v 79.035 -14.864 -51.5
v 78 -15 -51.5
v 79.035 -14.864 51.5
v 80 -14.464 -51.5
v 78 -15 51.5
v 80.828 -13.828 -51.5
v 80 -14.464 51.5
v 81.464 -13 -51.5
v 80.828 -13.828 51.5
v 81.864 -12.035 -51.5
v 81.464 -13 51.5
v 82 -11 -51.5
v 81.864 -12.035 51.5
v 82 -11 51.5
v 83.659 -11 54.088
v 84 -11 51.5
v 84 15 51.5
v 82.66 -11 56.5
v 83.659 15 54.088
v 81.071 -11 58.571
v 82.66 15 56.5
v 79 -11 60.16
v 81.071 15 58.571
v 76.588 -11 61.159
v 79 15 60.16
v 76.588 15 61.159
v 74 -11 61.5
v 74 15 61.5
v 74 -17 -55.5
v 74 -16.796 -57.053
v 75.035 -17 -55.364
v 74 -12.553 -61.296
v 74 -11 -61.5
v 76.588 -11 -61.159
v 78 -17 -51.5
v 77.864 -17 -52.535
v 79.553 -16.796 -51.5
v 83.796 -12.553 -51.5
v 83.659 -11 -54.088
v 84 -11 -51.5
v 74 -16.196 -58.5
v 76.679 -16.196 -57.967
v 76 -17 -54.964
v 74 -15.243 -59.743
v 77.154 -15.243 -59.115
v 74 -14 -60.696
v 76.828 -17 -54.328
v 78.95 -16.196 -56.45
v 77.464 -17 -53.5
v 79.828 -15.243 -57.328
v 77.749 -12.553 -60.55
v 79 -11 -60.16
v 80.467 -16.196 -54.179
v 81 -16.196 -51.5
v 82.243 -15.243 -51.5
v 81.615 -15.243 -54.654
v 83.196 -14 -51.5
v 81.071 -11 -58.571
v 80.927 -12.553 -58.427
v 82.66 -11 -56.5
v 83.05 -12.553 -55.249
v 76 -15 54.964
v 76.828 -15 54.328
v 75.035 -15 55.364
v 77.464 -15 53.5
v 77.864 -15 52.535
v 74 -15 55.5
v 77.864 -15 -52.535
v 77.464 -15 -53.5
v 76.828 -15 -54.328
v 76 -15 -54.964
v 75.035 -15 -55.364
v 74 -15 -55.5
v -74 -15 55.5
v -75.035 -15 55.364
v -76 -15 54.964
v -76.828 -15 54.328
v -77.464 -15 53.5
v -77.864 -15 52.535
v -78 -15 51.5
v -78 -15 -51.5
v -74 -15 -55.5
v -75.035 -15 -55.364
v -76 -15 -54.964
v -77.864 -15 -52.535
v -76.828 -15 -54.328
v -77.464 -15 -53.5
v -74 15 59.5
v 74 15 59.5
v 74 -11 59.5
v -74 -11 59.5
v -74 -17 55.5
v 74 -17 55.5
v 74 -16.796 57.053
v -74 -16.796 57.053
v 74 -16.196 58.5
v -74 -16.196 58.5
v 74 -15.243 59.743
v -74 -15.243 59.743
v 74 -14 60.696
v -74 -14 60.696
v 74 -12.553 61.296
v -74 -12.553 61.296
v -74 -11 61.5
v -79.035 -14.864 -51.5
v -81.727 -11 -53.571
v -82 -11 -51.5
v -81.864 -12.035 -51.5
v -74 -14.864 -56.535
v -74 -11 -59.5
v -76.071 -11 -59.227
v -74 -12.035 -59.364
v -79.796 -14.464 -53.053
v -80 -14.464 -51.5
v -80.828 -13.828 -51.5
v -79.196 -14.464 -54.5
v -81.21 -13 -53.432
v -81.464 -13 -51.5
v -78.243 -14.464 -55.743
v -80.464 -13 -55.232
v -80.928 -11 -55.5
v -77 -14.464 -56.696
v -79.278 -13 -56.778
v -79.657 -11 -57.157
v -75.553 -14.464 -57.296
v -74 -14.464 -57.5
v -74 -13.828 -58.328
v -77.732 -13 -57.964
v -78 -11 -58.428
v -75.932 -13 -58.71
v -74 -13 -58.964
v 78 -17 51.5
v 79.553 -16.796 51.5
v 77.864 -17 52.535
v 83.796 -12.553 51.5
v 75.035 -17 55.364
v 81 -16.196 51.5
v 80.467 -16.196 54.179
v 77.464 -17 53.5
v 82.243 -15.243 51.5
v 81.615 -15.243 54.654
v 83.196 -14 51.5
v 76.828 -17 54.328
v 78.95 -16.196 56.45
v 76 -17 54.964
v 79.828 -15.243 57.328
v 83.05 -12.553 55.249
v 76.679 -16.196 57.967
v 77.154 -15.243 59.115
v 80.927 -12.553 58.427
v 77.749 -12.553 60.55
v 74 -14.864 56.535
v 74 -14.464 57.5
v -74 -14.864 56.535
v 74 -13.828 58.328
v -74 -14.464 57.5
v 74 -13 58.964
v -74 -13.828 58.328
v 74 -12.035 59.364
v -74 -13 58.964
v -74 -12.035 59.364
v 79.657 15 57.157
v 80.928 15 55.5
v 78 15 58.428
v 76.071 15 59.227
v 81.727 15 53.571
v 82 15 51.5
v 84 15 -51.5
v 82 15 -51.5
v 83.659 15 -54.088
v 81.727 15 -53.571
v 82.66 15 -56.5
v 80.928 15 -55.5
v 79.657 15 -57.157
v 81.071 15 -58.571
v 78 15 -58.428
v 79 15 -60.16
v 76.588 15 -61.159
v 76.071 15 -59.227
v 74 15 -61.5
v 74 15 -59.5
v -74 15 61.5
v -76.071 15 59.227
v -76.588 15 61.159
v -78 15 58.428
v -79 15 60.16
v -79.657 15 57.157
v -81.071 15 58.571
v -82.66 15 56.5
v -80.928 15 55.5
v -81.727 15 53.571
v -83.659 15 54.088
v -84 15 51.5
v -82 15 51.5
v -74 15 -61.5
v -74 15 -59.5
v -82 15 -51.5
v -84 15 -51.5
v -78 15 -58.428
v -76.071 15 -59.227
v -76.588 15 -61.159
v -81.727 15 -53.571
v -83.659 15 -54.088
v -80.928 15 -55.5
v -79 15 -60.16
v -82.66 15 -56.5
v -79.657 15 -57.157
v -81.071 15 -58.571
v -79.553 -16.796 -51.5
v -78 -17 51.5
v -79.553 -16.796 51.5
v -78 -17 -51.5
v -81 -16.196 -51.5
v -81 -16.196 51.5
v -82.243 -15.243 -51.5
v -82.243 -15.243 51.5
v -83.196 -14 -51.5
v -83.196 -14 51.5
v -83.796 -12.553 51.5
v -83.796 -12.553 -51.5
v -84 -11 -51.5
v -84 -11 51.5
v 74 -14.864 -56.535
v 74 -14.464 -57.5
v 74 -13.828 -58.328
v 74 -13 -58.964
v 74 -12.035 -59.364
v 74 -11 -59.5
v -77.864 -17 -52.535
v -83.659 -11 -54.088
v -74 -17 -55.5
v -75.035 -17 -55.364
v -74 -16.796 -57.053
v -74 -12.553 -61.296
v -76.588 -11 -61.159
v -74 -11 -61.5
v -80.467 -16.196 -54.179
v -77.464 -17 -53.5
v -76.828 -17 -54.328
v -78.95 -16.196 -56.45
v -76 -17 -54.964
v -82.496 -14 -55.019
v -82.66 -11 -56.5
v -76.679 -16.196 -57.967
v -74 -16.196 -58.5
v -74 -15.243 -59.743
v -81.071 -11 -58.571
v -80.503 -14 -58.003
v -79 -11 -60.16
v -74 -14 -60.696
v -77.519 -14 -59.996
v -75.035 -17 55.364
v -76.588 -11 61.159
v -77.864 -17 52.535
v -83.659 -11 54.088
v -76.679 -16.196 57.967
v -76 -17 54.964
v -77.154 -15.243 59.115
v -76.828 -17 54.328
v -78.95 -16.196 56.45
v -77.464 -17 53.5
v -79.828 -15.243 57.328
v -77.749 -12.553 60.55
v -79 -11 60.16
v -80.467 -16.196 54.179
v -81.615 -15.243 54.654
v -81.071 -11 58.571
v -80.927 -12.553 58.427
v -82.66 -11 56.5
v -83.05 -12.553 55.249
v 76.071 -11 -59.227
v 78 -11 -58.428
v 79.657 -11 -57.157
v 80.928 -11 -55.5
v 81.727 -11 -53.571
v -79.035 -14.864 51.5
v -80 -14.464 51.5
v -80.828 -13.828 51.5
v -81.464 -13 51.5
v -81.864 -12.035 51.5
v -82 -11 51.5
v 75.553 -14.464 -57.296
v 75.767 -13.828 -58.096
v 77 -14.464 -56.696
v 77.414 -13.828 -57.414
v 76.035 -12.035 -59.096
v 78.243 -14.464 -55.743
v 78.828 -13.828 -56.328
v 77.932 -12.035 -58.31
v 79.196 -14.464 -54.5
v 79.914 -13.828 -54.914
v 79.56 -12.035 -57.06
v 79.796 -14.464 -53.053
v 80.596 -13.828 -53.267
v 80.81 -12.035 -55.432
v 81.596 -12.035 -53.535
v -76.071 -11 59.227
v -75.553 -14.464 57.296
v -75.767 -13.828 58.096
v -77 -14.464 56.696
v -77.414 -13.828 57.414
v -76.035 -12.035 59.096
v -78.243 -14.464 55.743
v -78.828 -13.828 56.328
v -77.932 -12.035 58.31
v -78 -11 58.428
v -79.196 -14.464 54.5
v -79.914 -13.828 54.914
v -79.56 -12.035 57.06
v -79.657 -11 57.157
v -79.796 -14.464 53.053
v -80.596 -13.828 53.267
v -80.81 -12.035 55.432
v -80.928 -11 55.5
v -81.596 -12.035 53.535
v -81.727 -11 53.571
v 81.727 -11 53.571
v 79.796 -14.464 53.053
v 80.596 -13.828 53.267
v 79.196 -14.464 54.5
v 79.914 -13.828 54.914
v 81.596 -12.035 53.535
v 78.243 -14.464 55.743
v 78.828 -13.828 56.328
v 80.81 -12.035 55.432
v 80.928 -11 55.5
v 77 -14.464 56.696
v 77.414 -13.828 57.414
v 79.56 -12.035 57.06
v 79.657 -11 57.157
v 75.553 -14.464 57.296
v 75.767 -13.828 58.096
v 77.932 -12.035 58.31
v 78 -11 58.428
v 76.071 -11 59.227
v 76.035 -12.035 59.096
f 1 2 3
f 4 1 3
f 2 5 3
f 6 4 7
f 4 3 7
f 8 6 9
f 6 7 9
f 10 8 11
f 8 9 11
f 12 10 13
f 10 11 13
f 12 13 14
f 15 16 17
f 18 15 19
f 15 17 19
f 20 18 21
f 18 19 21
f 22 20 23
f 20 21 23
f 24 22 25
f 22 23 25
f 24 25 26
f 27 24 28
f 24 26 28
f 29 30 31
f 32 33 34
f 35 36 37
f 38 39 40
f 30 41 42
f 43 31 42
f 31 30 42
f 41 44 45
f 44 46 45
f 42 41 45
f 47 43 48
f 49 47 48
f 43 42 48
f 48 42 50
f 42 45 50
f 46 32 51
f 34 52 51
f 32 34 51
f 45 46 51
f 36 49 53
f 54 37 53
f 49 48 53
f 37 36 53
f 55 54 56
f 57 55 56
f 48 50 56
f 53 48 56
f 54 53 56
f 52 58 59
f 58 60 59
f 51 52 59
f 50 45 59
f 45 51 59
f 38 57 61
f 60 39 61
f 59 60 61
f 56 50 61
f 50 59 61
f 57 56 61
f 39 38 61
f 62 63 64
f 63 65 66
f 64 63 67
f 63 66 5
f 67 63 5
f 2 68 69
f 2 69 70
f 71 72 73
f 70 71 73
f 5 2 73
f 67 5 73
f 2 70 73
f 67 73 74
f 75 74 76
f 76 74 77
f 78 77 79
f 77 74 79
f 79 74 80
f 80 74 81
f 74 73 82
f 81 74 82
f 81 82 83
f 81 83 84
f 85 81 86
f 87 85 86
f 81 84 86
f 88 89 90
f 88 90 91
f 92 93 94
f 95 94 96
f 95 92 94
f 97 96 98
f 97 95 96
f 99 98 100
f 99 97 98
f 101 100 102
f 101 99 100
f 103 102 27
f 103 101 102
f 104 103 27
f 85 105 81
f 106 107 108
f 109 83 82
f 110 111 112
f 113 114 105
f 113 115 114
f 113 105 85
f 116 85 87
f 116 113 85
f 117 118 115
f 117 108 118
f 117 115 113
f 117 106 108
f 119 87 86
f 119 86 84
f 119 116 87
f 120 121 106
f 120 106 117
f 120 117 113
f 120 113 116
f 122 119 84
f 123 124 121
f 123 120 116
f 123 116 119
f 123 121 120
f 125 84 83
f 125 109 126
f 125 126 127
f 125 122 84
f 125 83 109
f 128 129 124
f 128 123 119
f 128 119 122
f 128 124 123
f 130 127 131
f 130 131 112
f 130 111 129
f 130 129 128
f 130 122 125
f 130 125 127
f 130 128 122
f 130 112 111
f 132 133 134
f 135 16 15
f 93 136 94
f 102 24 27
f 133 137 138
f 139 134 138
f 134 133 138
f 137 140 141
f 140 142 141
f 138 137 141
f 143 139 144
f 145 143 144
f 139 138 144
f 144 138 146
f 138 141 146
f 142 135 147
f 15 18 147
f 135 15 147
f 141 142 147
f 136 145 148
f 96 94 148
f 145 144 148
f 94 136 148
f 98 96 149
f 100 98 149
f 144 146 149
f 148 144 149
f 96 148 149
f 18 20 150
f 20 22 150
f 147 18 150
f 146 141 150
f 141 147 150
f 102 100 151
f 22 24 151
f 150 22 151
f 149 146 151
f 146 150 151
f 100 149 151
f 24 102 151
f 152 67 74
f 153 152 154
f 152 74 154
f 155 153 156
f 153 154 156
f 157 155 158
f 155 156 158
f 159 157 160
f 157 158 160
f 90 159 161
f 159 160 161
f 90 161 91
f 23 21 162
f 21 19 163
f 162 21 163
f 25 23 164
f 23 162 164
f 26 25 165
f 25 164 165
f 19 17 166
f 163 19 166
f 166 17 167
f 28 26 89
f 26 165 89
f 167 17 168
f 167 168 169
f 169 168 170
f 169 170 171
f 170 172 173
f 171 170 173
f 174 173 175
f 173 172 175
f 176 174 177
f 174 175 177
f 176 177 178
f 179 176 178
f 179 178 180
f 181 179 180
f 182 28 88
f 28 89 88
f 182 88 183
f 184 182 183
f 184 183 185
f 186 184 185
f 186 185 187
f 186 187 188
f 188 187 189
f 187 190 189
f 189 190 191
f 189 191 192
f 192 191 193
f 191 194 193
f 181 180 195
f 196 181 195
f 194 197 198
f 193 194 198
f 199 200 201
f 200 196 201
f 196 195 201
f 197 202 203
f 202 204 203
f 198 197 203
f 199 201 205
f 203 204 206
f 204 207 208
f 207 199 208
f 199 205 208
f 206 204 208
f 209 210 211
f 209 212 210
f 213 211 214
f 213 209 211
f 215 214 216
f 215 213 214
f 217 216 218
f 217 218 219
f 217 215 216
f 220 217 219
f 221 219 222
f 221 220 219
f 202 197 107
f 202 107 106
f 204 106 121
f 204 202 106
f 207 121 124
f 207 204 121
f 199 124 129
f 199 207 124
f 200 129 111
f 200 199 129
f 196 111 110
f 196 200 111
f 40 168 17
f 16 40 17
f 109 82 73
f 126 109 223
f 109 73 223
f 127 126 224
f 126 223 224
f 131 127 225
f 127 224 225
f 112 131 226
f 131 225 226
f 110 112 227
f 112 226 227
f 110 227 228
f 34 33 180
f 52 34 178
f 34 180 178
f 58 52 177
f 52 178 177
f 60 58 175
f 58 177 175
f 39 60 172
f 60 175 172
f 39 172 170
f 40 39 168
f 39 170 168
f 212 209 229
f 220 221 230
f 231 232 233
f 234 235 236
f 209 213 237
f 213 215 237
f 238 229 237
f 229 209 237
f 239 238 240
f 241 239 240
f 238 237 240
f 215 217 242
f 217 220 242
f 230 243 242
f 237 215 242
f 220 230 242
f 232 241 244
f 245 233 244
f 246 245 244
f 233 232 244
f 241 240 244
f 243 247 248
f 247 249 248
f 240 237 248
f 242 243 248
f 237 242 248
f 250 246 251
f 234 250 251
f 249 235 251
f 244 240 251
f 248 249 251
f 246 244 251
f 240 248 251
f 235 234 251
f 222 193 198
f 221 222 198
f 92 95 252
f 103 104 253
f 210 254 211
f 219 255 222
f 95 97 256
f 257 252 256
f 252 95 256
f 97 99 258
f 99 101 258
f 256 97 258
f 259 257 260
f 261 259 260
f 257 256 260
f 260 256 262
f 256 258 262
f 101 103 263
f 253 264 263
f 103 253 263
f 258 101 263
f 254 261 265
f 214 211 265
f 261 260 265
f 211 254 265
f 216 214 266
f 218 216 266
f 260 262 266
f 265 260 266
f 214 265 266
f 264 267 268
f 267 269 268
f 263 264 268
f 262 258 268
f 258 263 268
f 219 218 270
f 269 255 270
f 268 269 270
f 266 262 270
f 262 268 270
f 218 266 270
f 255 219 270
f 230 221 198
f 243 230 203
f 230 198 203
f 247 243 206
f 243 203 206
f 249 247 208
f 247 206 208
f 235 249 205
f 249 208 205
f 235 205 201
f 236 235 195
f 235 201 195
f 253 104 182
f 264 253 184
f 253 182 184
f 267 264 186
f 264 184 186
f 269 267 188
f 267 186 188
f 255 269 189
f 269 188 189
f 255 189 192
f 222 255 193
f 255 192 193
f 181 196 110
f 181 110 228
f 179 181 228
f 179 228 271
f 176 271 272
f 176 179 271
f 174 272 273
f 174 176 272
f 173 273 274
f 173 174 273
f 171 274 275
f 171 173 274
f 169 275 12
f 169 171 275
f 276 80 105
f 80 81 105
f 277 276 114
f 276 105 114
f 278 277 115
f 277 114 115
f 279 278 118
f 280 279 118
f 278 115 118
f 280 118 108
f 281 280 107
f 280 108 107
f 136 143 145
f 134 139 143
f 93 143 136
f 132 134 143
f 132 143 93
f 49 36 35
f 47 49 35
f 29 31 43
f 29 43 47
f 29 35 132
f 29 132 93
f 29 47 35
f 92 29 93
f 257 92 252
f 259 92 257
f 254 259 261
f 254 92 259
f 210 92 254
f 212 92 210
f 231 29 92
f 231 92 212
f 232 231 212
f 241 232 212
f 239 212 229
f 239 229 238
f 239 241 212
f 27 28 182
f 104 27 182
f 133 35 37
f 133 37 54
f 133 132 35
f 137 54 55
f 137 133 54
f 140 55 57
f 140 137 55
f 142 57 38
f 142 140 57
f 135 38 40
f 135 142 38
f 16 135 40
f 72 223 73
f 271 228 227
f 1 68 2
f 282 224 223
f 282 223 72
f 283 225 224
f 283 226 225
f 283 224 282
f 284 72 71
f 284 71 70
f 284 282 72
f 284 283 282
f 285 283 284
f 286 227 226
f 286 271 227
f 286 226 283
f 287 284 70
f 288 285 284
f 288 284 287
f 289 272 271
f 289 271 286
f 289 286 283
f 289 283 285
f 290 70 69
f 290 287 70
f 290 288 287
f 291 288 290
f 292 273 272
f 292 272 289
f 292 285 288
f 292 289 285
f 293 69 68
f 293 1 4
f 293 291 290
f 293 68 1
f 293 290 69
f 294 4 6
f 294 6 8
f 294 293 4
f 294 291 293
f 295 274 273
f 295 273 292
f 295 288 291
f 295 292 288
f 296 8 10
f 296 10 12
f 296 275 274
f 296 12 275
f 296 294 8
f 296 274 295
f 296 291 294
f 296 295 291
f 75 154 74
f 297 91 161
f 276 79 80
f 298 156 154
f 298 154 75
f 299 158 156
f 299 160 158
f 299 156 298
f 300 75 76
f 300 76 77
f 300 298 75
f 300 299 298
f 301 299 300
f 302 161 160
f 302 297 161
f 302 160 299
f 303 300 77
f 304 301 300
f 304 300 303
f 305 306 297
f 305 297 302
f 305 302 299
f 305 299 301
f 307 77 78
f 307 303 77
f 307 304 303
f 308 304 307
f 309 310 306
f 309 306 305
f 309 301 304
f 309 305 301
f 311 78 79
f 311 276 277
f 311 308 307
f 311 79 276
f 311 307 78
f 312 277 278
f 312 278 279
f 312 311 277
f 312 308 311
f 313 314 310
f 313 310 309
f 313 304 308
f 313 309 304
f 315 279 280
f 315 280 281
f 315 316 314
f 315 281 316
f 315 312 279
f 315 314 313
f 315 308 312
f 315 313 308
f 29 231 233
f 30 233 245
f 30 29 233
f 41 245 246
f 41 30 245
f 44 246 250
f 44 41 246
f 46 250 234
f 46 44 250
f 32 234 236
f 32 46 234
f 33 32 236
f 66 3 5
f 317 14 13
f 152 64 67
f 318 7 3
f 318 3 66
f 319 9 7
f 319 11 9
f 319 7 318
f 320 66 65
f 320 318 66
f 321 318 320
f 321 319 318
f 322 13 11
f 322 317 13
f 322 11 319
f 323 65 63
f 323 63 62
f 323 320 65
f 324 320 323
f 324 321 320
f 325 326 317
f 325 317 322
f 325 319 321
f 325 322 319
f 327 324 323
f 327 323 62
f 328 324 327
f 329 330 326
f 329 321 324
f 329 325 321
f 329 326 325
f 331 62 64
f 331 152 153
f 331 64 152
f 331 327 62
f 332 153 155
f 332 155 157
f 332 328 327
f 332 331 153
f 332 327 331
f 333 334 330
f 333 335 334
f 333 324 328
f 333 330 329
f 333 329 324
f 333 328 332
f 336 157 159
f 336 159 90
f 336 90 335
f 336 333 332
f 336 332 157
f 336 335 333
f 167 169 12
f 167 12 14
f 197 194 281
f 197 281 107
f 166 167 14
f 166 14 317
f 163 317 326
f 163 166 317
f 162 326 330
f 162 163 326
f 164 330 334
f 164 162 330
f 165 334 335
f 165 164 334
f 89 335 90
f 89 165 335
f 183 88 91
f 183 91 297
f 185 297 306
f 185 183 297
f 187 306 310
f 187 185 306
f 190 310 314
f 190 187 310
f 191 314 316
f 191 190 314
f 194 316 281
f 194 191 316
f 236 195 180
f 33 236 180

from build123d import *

# Parameters (mm, degrees)
BOSS_EXTRUDE1_DEPTH = 15
FILLET1_R           = 4
SHELL1_T            = 2


with BuildPart() as part:
    # Sketch1 → Boss-Extrude1 (new, symmetric)
    with BuildSketch(Plane(origin=(0, 0, 0), x_dir=(1, 0, 0), z_dir=(0, 1, 0))):
        with BuildLine():
            Line((-74, 59.5), (74, 59.5))
            ThreePointArc((74, 59.5), (79.656854249, 57.156854249), (82, 51.5))
            Line((82, 51.5), (82, -51.5))
            ThreePointArc((82, -51.5), (79.656854249, -57.156854249), (74, -59.5))
            Line((74, -59.5), (-74, -59.5))
            ThreePointArc((-74, -59.5), (-79.656854249, -57.156854249), (-82, -51.5))
            Line((-82, -51.5), (-82, 51.5))
            ThreePointArc((-82, 51.5), (-79.656854249, 57.156854249), (-74, 59.5))
        make_face()
    extrude(amount=BOSS_EXTRUDE1_DEPTH, both=True)

    # Fillet1
    fillet1_edges = [part.edges().sort_by_distance(p)[0] for p in [
        (-79.656854249, -15, -57.156854249),
        (-82, -15, 0),
        (-79.656854249, -15, 57.156854249),
        (0, -15, 59.5),
        (79.656854249, -15, 57.156854249),
        (82, -15, 0),
        (79.656854249, -15, -57.156854249),
        (0, -15, -59.5),
    ]]
    fillet(fillet1_edges, radius=FILLET1_R)

    # Shell1
    shell1_openings = [part.faces().sort_by_distance(p)[0] for p in [
        (0, 15, 0),
    ]]
    offset(amount=SHELL1_T, openings=shell1_openings, kind=Kind.INTERSECTION)


solid = part.part
